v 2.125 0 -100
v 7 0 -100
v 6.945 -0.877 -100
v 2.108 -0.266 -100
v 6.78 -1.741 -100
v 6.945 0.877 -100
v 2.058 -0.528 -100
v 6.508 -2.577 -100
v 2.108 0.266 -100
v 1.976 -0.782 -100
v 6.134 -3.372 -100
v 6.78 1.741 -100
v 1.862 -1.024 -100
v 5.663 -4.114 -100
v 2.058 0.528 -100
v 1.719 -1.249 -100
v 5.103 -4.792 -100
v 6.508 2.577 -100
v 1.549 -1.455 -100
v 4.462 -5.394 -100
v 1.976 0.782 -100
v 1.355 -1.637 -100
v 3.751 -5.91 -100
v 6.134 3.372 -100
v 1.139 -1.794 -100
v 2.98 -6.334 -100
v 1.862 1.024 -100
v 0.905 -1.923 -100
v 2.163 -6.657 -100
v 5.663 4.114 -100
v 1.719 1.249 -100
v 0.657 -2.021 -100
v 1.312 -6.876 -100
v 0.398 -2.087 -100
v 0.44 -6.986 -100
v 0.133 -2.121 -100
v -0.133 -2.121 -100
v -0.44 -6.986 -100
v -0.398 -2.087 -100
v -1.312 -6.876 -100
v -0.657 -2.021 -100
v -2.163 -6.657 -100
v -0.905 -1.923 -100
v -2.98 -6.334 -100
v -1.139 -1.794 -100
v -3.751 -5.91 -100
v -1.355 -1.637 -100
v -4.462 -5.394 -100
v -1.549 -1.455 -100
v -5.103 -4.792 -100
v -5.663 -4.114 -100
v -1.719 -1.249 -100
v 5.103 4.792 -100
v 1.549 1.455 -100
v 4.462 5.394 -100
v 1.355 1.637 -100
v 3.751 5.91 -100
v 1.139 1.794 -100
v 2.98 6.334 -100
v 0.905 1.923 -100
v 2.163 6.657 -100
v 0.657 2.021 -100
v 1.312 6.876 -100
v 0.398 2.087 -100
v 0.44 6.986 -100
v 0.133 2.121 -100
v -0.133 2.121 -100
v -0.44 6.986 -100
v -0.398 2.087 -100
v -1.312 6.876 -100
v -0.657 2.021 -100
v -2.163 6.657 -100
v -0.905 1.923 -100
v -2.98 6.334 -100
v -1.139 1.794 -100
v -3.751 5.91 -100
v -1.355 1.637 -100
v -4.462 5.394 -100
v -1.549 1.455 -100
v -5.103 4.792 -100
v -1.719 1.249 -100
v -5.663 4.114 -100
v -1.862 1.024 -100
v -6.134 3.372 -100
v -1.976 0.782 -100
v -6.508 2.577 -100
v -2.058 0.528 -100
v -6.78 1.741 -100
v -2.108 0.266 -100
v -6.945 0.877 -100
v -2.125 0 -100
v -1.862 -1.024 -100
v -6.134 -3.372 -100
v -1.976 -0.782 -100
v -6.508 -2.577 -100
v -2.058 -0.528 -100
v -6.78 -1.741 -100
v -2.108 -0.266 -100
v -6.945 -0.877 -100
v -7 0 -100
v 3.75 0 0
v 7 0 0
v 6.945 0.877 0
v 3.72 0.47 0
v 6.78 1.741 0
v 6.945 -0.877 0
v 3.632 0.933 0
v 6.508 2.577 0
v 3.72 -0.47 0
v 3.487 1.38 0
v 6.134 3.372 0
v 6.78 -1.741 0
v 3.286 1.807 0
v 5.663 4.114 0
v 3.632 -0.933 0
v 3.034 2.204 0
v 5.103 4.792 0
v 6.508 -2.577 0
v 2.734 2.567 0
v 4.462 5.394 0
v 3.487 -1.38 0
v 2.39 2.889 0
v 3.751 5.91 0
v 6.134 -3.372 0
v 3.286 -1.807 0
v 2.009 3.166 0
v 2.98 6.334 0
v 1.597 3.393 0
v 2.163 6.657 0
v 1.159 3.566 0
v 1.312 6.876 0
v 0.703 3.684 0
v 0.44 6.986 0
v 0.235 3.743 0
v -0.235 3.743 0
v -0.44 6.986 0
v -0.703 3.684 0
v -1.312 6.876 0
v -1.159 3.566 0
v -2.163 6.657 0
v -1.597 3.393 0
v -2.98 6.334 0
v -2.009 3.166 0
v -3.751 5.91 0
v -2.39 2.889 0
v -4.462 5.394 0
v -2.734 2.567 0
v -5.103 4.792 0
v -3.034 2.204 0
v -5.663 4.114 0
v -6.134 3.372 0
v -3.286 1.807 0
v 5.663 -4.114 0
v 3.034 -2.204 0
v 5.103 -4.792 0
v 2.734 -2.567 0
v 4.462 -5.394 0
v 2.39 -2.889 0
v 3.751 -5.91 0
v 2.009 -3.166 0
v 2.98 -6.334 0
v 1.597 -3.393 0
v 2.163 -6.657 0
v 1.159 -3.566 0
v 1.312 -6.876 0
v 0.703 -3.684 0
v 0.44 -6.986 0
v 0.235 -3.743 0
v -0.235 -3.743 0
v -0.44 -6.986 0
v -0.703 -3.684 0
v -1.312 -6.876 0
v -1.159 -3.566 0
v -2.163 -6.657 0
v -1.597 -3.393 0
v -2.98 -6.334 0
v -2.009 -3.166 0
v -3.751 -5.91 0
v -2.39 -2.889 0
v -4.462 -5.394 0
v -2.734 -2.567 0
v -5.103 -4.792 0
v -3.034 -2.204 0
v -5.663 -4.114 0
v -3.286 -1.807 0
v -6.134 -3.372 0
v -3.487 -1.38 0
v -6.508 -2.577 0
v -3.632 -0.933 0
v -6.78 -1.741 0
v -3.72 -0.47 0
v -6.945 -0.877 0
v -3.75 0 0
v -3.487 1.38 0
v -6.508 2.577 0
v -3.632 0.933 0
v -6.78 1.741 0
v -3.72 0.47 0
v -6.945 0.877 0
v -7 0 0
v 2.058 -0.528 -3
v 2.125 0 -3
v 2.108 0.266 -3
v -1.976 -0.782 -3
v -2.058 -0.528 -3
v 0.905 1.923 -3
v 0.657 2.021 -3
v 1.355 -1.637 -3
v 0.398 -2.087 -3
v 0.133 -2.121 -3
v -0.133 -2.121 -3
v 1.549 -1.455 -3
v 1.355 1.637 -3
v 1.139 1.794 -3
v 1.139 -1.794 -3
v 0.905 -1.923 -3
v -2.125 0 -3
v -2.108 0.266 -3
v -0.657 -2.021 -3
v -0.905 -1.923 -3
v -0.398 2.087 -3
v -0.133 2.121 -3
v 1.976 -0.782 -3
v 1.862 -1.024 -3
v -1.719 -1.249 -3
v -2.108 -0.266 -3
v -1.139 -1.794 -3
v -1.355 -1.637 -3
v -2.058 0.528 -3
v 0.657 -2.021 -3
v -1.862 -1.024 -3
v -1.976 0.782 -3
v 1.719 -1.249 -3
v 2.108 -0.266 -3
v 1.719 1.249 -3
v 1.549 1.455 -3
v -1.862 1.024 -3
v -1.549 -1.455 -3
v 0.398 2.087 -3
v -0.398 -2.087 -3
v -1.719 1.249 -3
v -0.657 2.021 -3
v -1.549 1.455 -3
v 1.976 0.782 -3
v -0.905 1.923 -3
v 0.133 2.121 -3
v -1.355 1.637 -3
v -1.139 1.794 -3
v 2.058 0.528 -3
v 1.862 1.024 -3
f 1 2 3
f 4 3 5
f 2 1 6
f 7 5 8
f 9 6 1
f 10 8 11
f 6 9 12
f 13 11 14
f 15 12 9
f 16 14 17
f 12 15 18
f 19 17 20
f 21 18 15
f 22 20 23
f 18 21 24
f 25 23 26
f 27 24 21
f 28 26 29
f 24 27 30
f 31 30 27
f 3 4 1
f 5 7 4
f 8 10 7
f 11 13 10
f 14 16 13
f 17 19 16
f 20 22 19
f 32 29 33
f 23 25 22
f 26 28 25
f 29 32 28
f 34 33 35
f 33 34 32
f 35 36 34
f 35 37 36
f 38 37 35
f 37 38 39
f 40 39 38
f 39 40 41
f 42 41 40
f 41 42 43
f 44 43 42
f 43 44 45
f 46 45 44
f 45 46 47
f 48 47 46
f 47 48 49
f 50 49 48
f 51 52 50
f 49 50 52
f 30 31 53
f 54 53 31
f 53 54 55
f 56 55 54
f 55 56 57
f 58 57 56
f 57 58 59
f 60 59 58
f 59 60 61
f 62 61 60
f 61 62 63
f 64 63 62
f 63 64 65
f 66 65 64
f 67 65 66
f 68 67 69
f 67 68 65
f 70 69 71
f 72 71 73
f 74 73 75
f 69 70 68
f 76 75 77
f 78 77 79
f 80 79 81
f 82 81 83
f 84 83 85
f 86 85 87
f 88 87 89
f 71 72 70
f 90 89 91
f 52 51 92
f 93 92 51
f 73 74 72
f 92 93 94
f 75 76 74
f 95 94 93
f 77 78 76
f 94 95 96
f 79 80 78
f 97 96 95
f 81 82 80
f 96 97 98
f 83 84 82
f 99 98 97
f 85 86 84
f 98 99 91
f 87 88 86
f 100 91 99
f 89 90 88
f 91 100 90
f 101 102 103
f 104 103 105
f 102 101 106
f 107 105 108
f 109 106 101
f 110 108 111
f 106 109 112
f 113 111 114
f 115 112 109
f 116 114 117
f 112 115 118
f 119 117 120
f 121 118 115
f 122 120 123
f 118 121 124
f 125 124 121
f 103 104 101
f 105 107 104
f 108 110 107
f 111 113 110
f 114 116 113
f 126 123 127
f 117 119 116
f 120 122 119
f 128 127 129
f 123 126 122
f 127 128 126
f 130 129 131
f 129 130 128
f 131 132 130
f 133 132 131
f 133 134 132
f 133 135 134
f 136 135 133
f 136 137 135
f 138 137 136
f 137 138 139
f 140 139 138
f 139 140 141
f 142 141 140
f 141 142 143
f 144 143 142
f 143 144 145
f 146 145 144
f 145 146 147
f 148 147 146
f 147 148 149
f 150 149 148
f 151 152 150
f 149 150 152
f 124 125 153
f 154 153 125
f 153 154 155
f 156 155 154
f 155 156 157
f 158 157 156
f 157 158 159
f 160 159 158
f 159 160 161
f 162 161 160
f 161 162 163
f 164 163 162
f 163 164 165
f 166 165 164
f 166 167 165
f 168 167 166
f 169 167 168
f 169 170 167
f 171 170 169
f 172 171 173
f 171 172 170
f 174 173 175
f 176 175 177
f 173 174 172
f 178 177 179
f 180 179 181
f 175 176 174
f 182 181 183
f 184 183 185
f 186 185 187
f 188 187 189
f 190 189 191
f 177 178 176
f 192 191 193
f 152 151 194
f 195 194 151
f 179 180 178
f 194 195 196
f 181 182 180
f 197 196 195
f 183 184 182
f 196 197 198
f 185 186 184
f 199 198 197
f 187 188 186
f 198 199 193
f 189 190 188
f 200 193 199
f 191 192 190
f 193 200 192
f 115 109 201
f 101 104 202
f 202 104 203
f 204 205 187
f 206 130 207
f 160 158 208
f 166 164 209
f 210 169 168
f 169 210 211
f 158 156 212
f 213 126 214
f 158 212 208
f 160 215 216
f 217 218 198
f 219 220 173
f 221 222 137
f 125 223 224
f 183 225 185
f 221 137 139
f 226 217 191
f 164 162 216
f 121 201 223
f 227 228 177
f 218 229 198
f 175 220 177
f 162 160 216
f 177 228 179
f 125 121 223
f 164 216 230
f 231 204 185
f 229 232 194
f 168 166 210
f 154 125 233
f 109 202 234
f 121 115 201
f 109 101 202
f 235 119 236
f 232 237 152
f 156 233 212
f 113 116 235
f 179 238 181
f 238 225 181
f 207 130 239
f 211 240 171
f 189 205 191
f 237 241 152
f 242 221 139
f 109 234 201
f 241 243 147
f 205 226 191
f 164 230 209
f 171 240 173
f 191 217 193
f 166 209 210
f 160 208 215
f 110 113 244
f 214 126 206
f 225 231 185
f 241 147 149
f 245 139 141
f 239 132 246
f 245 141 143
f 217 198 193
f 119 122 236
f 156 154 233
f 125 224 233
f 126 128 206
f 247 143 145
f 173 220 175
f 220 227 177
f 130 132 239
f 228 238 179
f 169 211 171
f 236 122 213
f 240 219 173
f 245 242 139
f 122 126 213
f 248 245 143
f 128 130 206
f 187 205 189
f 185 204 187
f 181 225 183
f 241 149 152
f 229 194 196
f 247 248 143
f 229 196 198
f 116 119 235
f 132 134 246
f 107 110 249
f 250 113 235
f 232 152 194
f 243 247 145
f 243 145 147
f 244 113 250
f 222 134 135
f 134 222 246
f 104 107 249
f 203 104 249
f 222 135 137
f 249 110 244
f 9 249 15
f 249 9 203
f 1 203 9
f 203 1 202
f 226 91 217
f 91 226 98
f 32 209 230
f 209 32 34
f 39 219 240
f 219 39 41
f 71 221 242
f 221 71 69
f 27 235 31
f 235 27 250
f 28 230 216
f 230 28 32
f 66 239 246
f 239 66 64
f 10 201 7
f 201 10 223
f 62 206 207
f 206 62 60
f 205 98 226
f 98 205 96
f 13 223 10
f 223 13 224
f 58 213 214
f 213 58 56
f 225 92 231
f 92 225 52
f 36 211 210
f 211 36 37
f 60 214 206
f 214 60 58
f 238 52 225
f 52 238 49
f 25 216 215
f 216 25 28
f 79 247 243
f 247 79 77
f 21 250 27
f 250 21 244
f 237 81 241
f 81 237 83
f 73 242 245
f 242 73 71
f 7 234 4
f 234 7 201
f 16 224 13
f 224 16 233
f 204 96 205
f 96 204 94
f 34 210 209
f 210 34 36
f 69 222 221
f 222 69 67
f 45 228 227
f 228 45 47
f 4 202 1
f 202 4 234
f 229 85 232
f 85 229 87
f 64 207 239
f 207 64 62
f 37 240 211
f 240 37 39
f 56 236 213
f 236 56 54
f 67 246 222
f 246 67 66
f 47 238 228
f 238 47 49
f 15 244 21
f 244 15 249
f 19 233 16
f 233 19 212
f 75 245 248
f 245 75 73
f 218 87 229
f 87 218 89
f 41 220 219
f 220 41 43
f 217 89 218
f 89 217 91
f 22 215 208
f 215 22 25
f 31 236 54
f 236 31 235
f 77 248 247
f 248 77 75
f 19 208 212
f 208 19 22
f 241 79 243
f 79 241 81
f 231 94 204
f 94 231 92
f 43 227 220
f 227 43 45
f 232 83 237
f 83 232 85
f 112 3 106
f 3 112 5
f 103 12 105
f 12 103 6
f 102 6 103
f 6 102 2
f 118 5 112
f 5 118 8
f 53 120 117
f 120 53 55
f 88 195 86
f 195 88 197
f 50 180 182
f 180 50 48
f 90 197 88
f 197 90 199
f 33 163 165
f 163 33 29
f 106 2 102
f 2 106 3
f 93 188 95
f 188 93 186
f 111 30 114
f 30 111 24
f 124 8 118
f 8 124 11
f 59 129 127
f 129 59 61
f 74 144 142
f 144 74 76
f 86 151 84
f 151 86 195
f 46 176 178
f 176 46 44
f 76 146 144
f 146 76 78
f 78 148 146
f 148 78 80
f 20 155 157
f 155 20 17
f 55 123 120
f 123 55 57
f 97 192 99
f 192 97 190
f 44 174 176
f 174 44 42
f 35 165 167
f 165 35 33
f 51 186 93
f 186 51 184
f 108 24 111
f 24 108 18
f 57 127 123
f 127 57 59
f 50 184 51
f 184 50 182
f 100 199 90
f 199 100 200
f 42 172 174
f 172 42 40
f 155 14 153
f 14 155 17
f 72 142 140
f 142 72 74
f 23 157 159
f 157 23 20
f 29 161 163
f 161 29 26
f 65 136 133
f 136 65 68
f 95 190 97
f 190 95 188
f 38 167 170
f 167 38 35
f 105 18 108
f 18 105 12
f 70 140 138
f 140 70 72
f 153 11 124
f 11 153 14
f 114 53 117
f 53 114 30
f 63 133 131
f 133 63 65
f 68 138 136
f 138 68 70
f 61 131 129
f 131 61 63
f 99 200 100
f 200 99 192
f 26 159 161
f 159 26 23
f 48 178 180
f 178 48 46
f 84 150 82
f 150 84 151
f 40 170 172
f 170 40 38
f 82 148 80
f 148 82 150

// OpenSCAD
$fn = 50;


difference() {
	union() {
		translate(v = [0, 0, -100.0000000000]) {
			cylinder(h = 100, r = 7.0000000000);
		}
		cylinder(h = 0, r = 10.0000000000);
	}
	union() {
		translate(v = [0, 0, 0]) {
			rotate(a = [0, 0, 0]) {
				difference() {
					union() {
						#translate(v = [0, 0, -100.0000000000]) {
							cylinder(h = 100, r = 2.0000000000);
						}
						#translate(v = [0, 0, -3]) {
							cylinder(h = 3, r1 = 2.1250000000, r2 = 3.7500000000);
						}
						#translate(v = [0, 0, -100.0000000000]) {
							cylinder(h = 100, r = 2.1250000000);
						}
						#translate(v = [0, 0, -100.0000000000]) {
							cylinder(h = 100, r = 2.0000000000);
						}
					}
					union();
				}
			}
		}
	}
}
